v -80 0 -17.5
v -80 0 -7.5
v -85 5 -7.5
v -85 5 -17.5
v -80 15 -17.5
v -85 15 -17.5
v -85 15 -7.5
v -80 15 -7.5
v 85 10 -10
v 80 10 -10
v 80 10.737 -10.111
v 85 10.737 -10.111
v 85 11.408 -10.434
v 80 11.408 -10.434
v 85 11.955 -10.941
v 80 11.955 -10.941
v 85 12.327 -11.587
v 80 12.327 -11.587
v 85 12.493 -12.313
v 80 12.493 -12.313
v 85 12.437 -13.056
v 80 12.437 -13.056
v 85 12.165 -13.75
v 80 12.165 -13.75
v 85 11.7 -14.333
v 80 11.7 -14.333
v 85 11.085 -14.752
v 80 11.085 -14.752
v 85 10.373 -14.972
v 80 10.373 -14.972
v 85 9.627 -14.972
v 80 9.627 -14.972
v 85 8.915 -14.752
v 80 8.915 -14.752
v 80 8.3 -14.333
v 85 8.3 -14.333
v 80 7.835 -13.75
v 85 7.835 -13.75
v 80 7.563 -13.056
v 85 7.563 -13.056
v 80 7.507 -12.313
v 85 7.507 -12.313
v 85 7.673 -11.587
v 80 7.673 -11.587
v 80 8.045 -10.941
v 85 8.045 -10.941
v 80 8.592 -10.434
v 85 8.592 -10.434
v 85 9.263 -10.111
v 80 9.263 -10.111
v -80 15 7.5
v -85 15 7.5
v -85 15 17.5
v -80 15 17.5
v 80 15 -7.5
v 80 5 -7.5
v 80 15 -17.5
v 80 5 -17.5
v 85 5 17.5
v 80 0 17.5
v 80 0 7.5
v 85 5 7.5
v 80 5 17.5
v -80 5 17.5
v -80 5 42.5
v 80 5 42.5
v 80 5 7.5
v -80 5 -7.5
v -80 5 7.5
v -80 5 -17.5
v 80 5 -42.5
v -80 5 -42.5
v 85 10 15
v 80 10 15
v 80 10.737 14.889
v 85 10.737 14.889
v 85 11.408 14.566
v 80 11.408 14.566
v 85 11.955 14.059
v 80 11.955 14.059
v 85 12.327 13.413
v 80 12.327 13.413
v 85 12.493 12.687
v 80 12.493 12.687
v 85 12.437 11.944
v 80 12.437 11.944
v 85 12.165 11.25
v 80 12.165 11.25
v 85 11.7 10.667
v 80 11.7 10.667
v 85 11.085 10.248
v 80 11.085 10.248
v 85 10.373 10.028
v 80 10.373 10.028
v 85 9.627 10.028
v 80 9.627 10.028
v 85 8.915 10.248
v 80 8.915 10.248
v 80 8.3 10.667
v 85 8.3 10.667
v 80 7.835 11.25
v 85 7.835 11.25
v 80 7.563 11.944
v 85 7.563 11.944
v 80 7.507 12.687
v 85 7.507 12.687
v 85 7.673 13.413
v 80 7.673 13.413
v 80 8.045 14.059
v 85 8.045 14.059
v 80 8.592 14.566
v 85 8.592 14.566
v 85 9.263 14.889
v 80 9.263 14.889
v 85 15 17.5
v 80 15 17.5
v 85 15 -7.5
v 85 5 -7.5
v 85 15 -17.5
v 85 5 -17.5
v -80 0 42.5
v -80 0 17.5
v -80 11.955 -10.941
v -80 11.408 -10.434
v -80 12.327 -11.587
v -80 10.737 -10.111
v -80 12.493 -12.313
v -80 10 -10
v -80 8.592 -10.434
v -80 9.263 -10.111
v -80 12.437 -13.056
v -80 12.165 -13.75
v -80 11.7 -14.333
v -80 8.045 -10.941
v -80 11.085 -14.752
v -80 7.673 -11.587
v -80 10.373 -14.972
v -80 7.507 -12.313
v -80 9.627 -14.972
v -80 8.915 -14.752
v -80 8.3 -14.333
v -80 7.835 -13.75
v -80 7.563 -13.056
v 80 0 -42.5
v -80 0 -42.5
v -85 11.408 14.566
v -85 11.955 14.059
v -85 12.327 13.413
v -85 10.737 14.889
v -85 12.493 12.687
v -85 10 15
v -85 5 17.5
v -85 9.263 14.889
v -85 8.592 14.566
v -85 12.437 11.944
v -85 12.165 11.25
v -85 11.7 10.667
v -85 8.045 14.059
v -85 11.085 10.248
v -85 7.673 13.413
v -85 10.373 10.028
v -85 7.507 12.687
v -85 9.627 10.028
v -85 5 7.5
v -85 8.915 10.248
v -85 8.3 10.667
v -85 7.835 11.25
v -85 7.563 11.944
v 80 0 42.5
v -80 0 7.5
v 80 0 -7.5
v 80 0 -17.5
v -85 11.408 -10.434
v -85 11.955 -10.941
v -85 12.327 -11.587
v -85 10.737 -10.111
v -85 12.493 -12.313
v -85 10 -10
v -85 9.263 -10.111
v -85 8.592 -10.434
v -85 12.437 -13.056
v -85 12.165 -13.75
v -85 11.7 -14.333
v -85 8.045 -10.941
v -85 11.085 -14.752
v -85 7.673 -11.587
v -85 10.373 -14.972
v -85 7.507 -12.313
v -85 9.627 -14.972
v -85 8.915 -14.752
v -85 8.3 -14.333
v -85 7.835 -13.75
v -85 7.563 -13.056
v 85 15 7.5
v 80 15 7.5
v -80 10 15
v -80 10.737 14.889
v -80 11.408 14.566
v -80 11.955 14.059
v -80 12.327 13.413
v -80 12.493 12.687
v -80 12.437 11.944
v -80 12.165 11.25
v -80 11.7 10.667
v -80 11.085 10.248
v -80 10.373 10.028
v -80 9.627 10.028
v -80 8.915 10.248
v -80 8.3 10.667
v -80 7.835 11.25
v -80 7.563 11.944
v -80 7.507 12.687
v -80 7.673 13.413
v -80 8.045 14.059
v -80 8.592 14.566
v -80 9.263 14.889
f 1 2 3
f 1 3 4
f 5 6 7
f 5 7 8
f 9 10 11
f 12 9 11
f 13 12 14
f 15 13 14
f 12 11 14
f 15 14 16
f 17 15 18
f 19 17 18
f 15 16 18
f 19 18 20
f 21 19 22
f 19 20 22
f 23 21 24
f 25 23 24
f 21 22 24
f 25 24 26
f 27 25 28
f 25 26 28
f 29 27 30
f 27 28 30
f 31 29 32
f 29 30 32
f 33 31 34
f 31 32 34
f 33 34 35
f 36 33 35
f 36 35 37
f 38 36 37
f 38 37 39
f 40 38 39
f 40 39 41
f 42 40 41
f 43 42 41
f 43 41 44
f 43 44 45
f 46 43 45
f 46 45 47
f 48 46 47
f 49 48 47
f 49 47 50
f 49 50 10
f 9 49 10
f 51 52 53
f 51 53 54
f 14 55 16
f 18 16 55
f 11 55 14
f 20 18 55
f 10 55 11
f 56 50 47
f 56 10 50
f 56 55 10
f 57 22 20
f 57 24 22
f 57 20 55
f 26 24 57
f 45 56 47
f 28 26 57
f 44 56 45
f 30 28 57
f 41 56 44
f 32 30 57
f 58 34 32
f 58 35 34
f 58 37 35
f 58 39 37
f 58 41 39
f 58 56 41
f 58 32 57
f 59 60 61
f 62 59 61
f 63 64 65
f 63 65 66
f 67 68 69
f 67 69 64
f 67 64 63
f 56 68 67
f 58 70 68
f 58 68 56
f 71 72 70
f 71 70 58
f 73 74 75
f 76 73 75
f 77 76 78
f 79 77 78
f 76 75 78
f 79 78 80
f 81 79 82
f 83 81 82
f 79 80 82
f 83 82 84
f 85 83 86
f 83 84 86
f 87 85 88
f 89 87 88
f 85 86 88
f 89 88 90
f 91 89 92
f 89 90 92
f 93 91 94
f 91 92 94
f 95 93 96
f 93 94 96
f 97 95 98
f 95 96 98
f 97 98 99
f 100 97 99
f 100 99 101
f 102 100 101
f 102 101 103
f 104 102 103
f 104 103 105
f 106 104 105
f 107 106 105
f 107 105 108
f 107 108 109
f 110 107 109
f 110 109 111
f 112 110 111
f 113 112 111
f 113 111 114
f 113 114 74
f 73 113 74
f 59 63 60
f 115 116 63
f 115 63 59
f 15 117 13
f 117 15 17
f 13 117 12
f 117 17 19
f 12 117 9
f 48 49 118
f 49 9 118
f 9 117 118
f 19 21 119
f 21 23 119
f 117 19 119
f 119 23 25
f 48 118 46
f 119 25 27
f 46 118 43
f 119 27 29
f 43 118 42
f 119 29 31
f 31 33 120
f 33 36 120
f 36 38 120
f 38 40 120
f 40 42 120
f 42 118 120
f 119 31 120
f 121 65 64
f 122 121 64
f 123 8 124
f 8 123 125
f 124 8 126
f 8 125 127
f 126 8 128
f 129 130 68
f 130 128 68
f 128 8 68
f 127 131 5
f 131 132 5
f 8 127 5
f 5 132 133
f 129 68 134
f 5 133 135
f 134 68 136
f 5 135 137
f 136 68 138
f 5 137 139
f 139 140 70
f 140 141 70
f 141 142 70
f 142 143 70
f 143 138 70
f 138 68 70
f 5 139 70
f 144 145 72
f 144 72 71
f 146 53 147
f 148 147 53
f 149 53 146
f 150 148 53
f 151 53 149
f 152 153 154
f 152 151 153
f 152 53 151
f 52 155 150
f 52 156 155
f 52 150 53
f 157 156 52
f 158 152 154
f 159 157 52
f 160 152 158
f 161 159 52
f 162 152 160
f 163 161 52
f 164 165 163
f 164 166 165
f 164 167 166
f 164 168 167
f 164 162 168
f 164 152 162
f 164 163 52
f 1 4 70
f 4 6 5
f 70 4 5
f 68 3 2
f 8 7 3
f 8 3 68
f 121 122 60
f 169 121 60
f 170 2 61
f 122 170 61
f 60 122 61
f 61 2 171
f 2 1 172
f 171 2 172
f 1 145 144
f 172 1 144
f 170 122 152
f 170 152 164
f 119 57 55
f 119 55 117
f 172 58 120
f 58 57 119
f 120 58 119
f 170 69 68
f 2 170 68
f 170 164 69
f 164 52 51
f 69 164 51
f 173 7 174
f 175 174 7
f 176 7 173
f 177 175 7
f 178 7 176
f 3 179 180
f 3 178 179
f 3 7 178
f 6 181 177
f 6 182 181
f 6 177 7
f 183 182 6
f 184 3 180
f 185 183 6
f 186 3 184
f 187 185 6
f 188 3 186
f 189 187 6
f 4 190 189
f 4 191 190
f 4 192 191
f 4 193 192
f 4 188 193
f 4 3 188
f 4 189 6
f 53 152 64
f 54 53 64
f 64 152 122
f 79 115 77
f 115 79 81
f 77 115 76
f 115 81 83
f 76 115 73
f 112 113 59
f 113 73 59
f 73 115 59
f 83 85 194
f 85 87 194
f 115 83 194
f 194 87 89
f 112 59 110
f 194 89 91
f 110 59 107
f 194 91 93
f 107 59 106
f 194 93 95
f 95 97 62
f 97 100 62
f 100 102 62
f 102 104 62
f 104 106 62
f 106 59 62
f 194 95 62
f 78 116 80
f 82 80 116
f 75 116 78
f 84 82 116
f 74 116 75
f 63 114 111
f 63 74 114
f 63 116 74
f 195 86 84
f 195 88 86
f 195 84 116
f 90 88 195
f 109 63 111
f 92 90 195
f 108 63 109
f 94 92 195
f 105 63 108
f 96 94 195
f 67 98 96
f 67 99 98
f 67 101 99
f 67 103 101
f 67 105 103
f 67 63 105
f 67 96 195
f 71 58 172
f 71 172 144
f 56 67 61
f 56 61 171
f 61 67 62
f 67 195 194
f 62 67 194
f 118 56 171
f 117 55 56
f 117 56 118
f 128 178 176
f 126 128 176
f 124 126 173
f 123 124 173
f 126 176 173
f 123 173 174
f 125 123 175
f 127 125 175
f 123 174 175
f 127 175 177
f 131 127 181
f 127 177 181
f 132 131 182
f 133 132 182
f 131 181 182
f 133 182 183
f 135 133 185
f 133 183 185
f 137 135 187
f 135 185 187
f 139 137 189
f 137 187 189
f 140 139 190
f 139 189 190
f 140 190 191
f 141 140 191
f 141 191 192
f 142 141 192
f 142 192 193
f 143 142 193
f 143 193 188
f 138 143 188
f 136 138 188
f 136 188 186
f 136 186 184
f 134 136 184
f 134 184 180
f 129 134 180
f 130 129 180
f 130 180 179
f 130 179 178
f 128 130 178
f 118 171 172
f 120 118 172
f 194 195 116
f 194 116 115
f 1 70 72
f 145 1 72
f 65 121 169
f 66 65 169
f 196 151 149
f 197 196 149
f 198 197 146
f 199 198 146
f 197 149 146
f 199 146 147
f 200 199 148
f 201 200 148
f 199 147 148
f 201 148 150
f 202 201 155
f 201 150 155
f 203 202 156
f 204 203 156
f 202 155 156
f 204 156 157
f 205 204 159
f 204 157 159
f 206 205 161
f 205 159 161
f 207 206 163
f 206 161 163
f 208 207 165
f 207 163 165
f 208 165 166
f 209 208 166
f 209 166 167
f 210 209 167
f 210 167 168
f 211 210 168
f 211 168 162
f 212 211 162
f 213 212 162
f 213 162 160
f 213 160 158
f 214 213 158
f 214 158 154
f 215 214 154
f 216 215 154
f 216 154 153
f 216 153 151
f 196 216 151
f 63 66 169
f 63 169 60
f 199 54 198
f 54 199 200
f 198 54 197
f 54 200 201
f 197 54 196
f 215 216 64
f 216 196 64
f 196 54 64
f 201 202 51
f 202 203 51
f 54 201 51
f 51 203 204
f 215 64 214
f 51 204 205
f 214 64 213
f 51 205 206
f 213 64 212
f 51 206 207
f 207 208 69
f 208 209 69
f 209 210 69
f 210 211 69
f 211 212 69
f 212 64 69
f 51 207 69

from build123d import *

# Parameters (mm, degrees)
SKETCH1_W           = 170
SKETCH1_H           = 85
BOSS_EXTRUDE1_DEPTH = 5
SKETCH2_W           = 5
SKETCH2_H           = 10
BOSS_EXTRUDE2_DEPTH = 10
SKETCH3_R           = 2.5
CUT_EXTRUDE1_DEPTH  = 176.87282337
SKETCH4_W           = 5
SKETCH4_H           = 25
SKETCH4_H_2         = 15
CUT_EXTRUDE2_DEPTH  = 96.557574268
CHAMFER1_SIZE       = 5


with BuildPart() as part:
    # Sketch1 → Boss-Extrude1 (new body)
    with BuildSketch(Plane(origin=(0, 0, 0), x_dir=(1, 0, 0), z_dir=(0, 1, 0))):
        Rectangle(SKETCH1_W, SKETCH1_H)
    extrude(amount=BOSS_EXTRUDE1_DEPTH)

    # Sketch2 → Boss-Extrude2 (add)
    with BuildSketch(Plane(origin=(0, 5, 0), x_dir=(1, 0, 0), z_dir=(0, 1, 0))):
        with Locations((-82.5, 12.5)):
            Rectangle(SKETCH2_W, SKETCH2_H)
        with Locations((-82.5, -12.5)):
            Rectangle(SKETCH2_W, SKETCH2_H)
        with Locations((82.5, -12.5)):
            Rectangle(SKETCH2_W, SKETCH2_H)
        with Locations((82.5, 12.5)):
            Rectangle(SKETCH2_W, SKETCH2_H)
    extrude(amount=BOSS_EXTRUDE2_DEPTH)

    # Sketch3 → Cut-Extrude1 (cut, through all)
    with BuildSketch(Plane.ZY.offset(85)):
        with Locations((-12.5, 10)):
            Circle(SKETCH3_R)
        with Locations((12.5, 10)):
            Circle(SKETCH3_R)
    extrude(amount=-CUT_EXTRUDE1_DEPTH, mode=Mode.SUBTRACT)

    # Sketch4 → Cut-Extrude2 (cut, through all)
    with BuildSketch(Plane(origin=(0, 5, 0), x_dir=(1, 0, 0), z_dir=(0, 1, 0))):
        with Locations((-82.5, 30)):
            Rectangle(SKETCH4_W, SKETCH4_H)
        with Locations((-82.5, -30)):
            Rectangle(SKETCH4_W, SKETCH4_H)
        with Locations((-82.5, 0)):
            Rectangle(SKETCH4_W, SKETCH4_H_2)
        with Locations((82.5, 0)):
            Rectangle(SKETCH4_W, SKETCH4_H_2)
        with Locations((82.5, 30)):
            Rectangle(SKETCH4_W, SKETCH4_H)
        with Locations((82.5, -30)):
            Rectangle(SKETCH4_W, SKETCH4_H)
    extrude(amount=-CUT_EXTRUDE2_DEPTH, mode=Mode.SUBTRACT)

    # Chamfer1
    chamfer1_edges = [part.edges().sort_by_distance(p)[0] for p in [
        (85, 0, 12.5),
        (85, 0, -12.5),
        (-85, 0, 12.5),
        (-85, 0, -12.5),
    ]]
    chamfer(chamfer1_edges, length=CHAMFER1_SIZE)


solid = part.part
